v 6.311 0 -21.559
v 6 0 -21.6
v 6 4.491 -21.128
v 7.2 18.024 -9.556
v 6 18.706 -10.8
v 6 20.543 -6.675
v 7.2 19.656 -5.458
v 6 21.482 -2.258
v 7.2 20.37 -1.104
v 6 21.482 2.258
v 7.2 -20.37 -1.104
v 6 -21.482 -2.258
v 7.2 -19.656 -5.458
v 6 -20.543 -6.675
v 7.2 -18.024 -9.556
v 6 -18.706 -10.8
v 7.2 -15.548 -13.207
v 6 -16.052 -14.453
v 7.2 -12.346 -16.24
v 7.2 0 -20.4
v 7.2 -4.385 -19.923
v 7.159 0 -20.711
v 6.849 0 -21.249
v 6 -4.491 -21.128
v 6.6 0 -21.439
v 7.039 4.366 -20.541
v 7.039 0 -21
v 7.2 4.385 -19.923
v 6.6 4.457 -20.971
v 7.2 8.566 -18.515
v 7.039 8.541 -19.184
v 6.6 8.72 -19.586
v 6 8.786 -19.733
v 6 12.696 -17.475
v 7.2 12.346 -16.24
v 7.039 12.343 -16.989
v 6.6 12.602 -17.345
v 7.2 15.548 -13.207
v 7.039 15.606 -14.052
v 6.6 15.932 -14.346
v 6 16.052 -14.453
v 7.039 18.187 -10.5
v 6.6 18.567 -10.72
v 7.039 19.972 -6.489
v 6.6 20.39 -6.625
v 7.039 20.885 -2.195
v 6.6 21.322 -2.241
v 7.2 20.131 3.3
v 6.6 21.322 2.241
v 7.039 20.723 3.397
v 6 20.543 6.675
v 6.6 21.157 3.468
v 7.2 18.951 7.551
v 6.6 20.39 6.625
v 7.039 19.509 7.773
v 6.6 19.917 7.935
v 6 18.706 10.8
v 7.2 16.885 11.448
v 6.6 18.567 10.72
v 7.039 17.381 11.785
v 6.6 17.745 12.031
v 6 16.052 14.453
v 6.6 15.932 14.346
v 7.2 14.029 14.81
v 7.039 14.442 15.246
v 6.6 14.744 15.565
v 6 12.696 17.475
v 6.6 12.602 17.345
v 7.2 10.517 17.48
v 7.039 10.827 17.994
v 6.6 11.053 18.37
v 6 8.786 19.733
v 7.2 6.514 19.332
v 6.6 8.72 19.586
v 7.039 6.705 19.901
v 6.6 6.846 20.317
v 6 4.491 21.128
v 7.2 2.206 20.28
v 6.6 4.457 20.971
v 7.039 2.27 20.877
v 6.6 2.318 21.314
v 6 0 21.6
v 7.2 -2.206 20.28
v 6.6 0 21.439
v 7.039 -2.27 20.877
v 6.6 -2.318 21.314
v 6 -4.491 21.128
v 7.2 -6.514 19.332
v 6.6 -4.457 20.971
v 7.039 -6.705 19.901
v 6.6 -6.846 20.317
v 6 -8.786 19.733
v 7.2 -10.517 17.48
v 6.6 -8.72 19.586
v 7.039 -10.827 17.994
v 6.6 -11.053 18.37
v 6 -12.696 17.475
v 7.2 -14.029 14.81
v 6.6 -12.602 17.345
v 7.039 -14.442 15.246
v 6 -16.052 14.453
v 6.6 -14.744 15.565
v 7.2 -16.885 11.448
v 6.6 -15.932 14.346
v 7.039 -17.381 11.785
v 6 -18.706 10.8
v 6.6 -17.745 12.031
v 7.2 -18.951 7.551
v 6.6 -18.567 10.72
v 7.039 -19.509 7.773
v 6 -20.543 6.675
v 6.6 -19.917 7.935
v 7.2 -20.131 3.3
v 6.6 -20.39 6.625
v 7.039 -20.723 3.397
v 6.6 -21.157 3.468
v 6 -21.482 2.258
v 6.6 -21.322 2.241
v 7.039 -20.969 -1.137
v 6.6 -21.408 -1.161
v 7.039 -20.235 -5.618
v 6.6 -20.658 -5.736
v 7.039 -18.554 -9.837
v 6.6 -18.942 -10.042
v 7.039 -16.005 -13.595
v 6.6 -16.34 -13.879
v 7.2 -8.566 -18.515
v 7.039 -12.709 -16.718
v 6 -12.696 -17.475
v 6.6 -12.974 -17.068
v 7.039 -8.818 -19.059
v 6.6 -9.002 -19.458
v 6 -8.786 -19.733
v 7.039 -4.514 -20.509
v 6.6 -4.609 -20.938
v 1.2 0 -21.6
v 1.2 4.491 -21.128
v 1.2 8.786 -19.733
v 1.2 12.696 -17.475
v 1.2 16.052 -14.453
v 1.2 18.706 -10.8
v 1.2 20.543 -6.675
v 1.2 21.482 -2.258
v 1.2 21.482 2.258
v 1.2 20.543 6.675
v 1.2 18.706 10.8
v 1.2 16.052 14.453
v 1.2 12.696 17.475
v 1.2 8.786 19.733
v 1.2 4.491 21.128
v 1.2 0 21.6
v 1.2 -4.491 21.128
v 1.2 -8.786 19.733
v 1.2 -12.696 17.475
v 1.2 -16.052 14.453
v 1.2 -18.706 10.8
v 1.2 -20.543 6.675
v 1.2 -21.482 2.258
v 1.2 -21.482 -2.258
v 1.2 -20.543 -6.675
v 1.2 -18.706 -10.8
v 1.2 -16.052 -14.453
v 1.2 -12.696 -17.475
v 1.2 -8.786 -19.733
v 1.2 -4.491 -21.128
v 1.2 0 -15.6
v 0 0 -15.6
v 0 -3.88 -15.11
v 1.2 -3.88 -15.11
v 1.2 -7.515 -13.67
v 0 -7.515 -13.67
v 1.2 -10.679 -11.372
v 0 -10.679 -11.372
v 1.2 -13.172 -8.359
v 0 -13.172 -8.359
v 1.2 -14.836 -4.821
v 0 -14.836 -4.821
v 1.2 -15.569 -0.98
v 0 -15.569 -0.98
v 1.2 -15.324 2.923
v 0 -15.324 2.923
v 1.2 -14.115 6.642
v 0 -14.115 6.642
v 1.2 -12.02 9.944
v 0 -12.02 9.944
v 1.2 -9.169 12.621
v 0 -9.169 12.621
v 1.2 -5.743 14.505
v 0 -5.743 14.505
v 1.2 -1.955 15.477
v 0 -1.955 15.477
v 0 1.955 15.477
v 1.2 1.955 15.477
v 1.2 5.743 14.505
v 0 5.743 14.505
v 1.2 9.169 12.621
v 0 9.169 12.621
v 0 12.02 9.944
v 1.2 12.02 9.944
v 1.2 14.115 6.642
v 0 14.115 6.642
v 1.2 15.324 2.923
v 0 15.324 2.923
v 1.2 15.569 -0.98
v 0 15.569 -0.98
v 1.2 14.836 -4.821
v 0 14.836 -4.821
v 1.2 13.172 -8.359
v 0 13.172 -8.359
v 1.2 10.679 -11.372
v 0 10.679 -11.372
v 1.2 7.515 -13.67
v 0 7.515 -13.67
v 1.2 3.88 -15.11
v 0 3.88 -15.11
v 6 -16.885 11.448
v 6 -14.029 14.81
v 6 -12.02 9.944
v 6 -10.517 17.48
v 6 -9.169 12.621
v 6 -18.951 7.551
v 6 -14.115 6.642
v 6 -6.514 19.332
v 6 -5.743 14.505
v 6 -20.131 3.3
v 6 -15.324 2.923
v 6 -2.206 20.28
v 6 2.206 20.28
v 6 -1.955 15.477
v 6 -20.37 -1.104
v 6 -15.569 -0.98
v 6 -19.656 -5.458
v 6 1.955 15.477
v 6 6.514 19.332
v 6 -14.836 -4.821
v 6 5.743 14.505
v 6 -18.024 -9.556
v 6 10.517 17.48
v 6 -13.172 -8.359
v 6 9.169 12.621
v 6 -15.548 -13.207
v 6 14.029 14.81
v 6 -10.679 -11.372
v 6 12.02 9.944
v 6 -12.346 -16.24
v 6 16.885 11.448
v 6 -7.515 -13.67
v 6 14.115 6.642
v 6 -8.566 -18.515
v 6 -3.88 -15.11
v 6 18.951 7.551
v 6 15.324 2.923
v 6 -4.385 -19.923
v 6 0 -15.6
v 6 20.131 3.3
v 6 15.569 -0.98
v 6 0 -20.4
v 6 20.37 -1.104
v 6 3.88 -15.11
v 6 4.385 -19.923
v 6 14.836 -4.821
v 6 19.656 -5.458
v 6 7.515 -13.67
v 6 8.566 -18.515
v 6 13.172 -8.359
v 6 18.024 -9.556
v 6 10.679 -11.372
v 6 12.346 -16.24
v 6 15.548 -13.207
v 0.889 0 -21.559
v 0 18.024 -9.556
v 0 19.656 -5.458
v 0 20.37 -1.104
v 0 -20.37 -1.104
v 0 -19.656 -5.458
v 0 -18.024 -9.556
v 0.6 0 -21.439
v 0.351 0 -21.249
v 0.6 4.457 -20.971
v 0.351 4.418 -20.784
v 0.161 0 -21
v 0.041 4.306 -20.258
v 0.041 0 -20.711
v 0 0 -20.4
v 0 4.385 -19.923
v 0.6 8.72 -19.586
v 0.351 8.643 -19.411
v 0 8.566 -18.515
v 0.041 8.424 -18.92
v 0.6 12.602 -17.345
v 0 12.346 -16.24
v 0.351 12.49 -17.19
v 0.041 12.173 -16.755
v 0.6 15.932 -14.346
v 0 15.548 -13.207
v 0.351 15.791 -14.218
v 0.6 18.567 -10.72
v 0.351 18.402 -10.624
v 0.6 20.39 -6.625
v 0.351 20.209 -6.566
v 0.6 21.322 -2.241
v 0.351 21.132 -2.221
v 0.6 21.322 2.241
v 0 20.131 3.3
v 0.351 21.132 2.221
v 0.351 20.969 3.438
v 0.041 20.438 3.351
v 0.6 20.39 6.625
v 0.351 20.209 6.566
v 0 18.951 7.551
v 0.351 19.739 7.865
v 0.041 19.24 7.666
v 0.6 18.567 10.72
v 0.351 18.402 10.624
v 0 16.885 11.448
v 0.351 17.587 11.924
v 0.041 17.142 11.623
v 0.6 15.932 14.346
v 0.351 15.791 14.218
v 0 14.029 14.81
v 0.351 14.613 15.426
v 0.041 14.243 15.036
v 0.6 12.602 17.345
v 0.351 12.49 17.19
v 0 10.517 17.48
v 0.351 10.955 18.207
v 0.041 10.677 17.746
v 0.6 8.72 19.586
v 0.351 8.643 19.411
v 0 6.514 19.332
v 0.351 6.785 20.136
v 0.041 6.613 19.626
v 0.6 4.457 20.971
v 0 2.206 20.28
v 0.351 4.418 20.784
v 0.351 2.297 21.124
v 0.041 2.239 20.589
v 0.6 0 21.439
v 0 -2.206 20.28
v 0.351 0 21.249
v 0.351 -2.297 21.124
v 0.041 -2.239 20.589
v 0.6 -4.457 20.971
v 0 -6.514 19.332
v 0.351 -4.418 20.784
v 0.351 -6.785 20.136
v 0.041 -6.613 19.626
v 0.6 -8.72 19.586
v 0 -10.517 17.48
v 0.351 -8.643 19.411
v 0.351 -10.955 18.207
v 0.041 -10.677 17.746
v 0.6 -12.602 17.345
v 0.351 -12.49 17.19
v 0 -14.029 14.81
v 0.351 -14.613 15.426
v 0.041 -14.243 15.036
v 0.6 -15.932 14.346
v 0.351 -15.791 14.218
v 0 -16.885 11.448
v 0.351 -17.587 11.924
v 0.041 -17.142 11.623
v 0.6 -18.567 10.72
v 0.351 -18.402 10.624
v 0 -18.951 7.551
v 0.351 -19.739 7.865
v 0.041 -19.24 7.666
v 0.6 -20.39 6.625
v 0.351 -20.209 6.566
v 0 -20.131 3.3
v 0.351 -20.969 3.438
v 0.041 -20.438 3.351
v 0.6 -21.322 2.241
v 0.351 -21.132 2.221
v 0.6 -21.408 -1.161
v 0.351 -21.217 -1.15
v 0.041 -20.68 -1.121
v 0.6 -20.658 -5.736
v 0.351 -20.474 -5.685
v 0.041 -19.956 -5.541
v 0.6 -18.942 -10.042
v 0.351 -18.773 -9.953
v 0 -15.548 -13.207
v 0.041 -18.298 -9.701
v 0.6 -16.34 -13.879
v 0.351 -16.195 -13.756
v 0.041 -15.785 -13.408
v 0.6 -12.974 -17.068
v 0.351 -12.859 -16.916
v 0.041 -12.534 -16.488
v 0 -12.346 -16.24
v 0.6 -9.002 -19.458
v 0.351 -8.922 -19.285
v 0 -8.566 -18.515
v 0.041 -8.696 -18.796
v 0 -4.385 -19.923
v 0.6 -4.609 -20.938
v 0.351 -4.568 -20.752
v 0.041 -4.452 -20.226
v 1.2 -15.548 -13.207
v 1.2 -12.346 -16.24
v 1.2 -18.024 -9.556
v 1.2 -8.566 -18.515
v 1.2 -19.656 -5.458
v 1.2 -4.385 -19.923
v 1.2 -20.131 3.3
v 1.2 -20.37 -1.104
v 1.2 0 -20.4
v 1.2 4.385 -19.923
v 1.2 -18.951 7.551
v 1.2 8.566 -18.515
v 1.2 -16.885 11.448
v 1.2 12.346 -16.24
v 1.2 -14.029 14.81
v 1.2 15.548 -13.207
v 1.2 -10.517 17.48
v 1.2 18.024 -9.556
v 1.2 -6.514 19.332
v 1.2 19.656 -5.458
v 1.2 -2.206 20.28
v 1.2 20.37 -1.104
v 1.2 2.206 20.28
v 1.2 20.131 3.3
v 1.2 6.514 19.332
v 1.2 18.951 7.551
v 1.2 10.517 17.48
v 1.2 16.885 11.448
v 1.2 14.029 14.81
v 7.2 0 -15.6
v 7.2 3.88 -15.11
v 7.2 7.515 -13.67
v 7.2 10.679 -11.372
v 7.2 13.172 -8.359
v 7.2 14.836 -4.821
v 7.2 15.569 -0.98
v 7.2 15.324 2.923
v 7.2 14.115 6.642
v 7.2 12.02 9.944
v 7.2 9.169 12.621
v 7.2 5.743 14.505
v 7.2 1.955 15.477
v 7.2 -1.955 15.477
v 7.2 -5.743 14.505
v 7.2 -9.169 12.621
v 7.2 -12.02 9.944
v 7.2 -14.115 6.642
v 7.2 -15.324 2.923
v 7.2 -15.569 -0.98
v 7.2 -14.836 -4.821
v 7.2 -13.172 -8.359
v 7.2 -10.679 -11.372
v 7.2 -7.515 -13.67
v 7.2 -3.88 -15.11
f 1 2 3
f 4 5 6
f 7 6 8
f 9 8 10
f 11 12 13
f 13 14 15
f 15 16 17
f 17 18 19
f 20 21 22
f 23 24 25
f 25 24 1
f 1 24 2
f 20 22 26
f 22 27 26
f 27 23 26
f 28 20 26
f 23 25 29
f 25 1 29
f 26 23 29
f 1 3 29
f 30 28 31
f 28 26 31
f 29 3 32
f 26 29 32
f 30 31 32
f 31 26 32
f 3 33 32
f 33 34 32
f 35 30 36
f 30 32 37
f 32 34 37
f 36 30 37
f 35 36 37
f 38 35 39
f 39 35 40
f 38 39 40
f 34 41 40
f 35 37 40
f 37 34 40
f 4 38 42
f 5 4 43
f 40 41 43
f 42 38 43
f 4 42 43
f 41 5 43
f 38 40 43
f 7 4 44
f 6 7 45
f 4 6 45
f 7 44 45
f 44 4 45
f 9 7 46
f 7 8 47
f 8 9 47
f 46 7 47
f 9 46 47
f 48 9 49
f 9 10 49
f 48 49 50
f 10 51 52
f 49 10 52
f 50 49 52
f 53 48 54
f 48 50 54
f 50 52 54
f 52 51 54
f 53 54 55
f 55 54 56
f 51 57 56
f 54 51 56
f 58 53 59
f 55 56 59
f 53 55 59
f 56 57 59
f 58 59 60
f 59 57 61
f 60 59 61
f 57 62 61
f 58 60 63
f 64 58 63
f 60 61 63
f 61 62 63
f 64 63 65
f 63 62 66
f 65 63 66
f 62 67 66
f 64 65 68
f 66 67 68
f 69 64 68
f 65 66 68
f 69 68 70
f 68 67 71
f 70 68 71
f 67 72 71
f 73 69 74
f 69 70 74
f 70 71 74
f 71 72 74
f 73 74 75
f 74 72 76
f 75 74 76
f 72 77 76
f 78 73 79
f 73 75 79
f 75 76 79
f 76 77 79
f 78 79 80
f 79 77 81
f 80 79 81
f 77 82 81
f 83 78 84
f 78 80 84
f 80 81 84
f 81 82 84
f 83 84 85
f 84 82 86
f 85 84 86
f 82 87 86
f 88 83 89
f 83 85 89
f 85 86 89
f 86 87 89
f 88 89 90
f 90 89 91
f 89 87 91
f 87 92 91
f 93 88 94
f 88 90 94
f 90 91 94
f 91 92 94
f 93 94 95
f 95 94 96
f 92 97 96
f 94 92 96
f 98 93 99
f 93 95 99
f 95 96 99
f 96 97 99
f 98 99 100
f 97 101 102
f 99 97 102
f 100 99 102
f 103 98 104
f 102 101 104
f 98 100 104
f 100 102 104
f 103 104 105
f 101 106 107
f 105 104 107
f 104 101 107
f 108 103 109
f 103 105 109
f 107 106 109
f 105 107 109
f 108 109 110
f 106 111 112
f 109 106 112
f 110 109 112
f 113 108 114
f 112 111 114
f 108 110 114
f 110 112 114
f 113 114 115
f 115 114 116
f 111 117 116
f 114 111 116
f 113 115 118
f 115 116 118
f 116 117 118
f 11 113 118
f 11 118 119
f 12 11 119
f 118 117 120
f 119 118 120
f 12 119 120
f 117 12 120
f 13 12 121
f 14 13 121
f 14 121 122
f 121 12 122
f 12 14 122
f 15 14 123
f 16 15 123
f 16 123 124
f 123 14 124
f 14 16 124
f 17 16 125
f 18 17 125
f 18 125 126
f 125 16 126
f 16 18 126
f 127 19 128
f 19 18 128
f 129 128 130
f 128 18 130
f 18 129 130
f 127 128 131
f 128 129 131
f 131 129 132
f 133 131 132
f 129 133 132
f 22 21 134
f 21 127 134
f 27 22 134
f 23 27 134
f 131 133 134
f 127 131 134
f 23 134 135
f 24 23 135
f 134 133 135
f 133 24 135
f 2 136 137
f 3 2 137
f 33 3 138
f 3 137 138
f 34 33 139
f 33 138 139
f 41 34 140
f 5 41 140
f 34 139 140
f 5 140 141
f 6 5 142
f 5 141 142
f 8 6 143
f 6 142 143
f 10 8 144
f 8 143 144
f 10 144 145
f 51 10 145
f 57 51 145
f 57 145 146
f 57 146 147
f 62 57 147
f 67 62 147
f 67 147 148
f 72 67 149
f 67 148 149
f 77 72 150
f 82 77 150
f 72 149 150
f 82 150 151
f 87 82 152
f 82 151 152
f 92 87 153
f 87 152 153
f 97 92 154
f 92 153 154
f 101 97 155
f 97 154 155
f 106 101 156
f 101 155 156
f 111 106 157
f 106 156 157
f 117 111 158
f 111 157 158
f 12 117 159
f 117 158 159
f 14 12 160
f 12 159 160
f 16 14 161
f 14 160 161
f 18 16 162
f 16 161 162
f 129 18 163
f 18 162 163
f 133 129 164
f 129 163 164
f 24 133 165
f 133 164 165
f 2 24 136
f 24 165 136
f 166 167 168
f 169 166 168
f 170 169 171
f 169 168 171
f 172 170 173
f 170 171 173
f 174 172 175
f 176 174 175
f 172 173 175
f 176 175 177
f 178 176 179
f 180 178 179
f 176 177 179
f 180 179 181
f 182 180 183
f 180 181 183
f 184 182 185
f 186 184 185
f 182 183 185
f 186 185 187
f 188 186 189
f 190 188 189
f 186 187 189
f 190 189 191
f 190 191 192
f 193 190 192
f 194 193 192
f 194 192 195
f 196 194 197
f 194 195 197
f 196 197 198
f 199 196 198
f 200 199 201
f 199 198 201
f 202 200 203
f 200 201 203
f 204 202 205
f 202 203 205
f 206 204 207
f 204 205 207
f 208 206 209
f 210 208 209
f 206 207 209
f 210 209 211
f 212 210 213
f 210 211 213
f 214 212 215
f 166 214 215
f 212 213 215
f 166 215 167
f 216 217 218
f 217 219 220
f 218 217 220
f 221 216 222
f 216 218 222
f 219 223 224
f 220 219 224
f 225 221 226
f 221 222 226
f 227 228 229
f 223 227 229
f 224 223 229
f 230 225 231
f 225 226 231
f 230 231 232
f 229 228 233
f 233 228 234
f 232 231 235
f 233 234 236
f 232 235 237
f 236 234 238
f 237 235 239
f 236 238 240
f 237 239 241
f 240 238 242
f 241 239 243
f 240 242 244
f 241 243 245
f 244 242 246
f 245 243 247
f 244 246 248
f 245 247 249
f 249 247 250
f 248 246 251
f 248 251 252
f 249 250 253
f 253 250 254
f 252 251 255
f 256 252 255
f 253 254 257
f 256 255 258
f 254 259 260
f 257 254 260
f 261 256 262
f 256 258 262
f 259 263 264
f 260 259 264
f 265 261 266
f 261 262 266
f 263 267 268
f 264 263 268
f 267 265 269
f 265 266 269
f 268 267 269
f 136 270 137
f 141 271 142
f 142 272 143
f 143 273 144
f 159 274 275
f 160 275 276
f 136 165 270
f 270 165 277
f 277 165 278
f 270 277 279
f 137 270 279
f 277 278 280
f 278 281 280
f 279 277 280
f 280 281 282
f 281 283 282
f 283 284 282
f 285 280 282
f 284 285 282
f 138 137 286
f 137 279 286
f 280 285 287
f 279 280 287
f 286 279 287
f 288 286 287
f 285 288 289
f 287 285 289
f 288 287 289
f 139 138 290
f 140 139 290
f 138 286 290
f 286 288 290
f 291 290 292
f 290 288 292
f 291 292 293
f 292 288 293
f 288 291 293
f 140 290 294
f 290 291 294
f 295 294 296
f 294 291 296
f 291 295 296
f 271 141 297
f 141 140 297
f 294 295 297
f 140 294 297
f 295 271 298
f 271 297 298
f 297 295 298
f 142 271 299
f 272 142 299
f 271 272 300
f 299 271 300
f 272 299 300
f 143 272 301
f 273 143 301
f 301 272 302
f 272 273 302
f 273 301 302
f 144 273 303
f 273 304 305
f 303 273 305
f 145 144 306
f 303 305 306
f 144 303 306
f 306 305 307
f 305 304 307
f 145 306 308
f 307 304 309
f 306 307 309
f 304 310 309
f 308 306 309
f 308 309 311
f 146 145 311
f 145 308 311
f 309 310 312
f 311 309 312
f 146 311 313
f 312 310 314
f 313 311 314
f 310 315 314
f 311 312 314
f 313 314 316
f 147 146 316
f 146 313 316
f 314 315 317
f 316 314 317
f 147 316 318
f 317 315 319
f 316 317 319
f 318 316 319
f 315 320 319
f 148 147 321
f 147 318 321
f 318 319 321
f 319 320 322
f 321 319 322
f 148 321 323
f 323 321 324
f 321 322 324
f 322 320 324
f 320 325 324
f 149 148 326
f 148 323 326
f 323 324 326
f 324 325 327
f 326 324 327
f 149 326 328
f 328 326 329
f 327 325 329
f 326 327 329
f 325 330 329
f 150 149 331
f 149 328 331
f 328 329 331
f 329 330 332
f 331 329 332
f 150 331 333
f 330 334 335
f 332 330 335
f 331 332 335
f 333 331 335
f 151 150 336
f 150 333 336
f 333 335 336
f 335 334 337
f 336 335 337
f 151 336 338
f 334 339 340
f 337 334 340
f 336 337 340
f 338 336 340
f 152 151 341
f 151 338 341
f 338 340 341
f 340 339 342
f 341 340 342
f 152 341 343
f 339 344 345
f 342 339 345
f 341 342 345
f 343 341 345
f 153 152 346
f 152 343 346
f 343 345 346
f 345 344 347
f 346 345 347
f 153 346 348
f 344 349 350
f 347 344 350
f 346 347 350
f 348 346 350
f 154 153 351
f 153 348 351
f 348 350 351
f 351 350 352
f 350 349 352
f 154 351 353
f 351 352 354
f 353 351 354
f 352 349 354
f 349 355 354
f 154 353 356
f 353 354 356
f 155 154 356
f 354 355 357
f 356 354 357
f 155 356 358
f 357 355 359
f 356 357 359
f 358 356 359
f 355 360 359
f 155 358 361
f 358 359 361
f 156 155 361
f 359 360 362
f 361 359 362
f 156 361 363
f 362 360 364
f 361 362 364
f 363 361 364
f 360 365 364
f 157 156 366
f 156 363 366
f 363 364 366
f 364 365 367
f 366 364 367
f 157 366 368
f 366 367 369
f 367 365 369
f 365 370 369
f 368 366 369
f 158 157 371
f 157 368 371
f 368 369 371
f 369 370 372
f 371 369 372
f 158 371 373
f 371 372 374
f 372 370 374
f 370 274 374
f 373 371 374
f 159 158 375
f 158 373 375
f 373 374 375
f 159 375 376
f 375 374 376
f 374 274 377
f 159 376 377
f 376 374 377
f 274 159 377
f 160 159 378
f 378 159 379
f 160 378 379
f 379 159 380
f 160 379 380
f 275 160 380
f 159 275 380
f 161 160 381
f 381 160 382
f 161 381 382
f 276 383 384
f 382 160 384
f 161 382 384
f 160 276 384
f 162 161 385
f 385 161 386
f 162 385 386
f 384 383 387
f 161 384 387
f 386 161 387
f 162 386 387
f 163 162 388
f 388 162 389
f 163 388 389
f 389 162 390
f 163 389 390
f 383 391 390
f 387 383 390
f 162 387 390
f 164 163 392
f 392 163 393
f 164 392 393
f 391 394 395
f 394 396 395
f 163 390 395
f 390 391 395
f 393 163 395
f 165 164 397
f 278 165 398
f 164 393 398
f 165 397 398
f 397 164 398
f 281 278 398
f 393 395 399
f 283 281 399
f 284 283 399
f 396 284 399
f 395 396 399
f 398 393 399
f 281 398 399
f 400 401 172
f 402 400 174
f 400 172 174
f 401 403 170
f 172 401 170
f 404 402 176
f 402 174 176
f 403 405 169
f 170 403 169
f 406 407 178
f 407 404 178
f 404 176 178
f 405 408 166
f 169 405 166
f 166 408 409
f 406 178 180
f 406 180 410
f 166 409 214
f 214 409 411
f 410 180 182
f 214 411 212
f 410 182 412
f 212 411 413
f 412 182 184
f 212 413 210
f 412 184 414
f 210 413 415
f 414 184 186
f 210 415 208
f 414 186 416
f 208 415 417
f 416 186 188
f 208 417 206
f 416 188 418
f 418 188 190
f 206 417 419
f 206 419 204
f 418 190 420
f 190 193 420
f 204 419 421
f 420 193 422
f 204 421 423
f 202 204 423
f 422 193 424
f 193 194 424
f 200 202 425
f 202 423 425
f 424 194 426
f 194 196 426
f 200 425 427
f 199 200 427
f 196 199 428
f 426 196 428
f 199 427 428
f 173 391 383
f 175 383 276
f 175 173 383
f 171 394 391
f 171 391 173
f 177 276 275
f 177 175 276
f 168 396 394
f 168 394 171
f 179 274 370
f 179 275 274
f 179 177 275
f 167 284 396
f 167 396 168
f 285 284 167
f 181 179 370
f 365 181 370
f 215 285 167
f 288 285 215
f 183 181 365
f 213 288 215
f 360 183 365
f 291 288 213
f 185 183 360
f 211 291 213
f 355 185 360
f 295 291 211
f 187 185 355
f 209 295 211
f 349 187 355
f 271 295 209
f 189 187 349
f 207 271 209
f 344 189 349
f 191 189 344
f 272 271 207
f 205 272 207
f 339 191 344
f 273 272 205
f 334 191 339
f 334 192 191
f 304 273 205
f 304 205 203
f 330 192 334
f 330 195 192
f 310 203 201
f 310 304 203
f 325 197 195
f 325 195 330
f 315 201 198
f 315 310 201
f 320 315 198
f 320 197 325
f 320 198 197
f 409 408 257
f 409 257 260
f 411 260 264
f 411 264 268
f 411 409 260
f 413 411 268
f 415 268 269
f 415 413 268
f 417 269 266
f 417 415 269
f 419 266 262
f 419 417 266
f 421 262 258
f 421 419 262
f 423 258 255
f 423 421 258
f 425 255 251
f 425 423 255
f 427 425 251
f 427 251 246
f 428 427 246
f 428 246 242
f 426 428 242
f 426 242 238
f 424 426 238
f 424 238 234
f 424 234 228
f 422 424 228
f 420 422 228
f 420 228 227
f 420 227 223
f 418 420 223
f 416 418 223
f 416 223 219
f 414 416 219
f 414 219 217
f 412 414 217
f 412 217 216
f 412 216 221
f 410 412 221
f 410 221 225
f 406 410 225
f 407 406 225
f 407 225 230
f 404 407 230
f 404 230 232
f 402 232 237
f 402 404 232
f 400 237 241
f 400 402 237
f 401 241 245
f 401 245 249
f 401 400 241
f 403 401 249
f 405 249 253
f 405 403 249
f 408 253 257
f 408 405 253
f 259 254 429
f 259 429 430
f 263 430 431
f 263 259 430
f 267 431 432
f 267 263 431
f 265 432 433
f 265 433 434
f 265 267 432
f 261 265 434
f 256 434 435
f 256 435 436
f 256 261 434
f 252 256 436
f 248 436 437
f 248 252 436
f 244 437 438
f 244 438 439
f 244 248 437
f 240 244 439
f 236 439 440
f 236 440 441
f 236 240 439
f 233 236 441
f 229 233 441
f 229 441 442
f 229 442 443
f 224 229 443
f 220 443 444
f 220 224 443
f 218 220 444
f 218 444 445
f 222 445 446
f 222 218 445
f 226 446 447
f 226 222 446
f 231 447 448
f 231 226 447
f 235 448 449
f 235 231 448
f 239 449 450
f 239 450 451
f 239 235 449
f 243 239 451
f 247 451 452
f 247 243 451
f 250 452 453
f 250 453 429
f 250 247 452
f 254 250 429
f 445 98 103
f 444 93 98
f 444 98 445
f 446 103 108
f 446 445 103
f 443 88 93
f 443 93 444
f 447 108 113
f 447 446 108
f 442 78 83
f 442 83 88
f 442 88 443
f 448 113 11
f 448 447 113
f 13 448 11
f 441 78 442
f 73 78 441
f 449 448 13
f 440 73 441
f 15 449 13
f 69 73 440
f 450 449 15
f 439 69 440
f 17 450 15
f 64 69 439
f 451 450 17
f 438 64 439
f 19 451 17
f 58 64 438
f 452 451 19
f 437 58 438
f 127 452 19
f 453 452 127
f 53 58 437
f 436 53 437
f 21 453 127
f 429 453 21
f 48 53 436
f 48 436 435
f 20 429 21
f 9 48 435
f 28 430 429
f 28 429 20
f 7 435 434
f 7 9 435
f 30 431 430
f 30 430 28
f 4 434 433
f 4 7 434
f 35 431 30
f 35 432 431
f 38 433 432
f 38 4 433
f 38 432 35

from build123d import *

# Parameters (mm, degrees)
ESQUISSE1_R        = 21.6
ESQUISSE1_R_2      = 20.4
BOSS_EXTRU_3_DEPTH = 7.2
BOSS_EXTRU_4_START = -1.2
ESQUISSE4_R        = 20.4
ESQUISSE4_R_2      = 15.6
BOSS_EXTRU_4_DEPTH = 1.2
ESQUISSE5_R        = 20.4
ESQUISSE5_R_2      = 15.6
BOSS_EXTRU_5_DEPTH = 1.2
CONG_3_R           = 1.2


with BuildPart() as part:
    # Esquisse1 → Boss.-Extru.3 (new body)
    with BuildSketch(Plane(origin=(0, 0, 0), x_dir=(0, 0, -1), z_dir=(1, 0, 0))):
        Circle(ESQUISSE1_R)
        Circle(ESQUISSE1_R_2, mode=Mode.SUBTRACT)
    extrude(amount=BOSS_EXTRU_3_DEPTH)

    # Esquisse4 → Boss.-Extru.4 (add)
    with BuildSketch(Plane(origin=(7.2, 0, 0), x_dir=(0, 0, -1), z_dir=(1, 0, 0)).offset(BOSS_EXTRU_4_START)):
        Circle(ESQUISSE4_R)
        Circle(ESQUISSE4_R_2, mode=Mode.SUBTRACT)
    extrude(amount=BOSS_EXTRU_4_DEPTH)

    # Esquisse5 → Boss.-Extru.5 (add)
    with BuildSketch(Plane.ZY):
        Circle(ESQUISSE5_R)
        with Locations(Location((0, 0, 0), (0, 0, 180))):
            Circle(ESQUISSE5_R_2, mode=Mode.SUBTRACT)
    extrude(amount=-BOSS_EXTRU_5_DEPTH)

    # Congé3
    cong_3_edges = [part.edges().sort_by_distance(p)[0] for p in [
        (0, 0, 21.6),
        (7.2, 0, 21.6),
    ]]
    fillet(cong_3_edges, radius=CONG_3_R)


solid = part.part
